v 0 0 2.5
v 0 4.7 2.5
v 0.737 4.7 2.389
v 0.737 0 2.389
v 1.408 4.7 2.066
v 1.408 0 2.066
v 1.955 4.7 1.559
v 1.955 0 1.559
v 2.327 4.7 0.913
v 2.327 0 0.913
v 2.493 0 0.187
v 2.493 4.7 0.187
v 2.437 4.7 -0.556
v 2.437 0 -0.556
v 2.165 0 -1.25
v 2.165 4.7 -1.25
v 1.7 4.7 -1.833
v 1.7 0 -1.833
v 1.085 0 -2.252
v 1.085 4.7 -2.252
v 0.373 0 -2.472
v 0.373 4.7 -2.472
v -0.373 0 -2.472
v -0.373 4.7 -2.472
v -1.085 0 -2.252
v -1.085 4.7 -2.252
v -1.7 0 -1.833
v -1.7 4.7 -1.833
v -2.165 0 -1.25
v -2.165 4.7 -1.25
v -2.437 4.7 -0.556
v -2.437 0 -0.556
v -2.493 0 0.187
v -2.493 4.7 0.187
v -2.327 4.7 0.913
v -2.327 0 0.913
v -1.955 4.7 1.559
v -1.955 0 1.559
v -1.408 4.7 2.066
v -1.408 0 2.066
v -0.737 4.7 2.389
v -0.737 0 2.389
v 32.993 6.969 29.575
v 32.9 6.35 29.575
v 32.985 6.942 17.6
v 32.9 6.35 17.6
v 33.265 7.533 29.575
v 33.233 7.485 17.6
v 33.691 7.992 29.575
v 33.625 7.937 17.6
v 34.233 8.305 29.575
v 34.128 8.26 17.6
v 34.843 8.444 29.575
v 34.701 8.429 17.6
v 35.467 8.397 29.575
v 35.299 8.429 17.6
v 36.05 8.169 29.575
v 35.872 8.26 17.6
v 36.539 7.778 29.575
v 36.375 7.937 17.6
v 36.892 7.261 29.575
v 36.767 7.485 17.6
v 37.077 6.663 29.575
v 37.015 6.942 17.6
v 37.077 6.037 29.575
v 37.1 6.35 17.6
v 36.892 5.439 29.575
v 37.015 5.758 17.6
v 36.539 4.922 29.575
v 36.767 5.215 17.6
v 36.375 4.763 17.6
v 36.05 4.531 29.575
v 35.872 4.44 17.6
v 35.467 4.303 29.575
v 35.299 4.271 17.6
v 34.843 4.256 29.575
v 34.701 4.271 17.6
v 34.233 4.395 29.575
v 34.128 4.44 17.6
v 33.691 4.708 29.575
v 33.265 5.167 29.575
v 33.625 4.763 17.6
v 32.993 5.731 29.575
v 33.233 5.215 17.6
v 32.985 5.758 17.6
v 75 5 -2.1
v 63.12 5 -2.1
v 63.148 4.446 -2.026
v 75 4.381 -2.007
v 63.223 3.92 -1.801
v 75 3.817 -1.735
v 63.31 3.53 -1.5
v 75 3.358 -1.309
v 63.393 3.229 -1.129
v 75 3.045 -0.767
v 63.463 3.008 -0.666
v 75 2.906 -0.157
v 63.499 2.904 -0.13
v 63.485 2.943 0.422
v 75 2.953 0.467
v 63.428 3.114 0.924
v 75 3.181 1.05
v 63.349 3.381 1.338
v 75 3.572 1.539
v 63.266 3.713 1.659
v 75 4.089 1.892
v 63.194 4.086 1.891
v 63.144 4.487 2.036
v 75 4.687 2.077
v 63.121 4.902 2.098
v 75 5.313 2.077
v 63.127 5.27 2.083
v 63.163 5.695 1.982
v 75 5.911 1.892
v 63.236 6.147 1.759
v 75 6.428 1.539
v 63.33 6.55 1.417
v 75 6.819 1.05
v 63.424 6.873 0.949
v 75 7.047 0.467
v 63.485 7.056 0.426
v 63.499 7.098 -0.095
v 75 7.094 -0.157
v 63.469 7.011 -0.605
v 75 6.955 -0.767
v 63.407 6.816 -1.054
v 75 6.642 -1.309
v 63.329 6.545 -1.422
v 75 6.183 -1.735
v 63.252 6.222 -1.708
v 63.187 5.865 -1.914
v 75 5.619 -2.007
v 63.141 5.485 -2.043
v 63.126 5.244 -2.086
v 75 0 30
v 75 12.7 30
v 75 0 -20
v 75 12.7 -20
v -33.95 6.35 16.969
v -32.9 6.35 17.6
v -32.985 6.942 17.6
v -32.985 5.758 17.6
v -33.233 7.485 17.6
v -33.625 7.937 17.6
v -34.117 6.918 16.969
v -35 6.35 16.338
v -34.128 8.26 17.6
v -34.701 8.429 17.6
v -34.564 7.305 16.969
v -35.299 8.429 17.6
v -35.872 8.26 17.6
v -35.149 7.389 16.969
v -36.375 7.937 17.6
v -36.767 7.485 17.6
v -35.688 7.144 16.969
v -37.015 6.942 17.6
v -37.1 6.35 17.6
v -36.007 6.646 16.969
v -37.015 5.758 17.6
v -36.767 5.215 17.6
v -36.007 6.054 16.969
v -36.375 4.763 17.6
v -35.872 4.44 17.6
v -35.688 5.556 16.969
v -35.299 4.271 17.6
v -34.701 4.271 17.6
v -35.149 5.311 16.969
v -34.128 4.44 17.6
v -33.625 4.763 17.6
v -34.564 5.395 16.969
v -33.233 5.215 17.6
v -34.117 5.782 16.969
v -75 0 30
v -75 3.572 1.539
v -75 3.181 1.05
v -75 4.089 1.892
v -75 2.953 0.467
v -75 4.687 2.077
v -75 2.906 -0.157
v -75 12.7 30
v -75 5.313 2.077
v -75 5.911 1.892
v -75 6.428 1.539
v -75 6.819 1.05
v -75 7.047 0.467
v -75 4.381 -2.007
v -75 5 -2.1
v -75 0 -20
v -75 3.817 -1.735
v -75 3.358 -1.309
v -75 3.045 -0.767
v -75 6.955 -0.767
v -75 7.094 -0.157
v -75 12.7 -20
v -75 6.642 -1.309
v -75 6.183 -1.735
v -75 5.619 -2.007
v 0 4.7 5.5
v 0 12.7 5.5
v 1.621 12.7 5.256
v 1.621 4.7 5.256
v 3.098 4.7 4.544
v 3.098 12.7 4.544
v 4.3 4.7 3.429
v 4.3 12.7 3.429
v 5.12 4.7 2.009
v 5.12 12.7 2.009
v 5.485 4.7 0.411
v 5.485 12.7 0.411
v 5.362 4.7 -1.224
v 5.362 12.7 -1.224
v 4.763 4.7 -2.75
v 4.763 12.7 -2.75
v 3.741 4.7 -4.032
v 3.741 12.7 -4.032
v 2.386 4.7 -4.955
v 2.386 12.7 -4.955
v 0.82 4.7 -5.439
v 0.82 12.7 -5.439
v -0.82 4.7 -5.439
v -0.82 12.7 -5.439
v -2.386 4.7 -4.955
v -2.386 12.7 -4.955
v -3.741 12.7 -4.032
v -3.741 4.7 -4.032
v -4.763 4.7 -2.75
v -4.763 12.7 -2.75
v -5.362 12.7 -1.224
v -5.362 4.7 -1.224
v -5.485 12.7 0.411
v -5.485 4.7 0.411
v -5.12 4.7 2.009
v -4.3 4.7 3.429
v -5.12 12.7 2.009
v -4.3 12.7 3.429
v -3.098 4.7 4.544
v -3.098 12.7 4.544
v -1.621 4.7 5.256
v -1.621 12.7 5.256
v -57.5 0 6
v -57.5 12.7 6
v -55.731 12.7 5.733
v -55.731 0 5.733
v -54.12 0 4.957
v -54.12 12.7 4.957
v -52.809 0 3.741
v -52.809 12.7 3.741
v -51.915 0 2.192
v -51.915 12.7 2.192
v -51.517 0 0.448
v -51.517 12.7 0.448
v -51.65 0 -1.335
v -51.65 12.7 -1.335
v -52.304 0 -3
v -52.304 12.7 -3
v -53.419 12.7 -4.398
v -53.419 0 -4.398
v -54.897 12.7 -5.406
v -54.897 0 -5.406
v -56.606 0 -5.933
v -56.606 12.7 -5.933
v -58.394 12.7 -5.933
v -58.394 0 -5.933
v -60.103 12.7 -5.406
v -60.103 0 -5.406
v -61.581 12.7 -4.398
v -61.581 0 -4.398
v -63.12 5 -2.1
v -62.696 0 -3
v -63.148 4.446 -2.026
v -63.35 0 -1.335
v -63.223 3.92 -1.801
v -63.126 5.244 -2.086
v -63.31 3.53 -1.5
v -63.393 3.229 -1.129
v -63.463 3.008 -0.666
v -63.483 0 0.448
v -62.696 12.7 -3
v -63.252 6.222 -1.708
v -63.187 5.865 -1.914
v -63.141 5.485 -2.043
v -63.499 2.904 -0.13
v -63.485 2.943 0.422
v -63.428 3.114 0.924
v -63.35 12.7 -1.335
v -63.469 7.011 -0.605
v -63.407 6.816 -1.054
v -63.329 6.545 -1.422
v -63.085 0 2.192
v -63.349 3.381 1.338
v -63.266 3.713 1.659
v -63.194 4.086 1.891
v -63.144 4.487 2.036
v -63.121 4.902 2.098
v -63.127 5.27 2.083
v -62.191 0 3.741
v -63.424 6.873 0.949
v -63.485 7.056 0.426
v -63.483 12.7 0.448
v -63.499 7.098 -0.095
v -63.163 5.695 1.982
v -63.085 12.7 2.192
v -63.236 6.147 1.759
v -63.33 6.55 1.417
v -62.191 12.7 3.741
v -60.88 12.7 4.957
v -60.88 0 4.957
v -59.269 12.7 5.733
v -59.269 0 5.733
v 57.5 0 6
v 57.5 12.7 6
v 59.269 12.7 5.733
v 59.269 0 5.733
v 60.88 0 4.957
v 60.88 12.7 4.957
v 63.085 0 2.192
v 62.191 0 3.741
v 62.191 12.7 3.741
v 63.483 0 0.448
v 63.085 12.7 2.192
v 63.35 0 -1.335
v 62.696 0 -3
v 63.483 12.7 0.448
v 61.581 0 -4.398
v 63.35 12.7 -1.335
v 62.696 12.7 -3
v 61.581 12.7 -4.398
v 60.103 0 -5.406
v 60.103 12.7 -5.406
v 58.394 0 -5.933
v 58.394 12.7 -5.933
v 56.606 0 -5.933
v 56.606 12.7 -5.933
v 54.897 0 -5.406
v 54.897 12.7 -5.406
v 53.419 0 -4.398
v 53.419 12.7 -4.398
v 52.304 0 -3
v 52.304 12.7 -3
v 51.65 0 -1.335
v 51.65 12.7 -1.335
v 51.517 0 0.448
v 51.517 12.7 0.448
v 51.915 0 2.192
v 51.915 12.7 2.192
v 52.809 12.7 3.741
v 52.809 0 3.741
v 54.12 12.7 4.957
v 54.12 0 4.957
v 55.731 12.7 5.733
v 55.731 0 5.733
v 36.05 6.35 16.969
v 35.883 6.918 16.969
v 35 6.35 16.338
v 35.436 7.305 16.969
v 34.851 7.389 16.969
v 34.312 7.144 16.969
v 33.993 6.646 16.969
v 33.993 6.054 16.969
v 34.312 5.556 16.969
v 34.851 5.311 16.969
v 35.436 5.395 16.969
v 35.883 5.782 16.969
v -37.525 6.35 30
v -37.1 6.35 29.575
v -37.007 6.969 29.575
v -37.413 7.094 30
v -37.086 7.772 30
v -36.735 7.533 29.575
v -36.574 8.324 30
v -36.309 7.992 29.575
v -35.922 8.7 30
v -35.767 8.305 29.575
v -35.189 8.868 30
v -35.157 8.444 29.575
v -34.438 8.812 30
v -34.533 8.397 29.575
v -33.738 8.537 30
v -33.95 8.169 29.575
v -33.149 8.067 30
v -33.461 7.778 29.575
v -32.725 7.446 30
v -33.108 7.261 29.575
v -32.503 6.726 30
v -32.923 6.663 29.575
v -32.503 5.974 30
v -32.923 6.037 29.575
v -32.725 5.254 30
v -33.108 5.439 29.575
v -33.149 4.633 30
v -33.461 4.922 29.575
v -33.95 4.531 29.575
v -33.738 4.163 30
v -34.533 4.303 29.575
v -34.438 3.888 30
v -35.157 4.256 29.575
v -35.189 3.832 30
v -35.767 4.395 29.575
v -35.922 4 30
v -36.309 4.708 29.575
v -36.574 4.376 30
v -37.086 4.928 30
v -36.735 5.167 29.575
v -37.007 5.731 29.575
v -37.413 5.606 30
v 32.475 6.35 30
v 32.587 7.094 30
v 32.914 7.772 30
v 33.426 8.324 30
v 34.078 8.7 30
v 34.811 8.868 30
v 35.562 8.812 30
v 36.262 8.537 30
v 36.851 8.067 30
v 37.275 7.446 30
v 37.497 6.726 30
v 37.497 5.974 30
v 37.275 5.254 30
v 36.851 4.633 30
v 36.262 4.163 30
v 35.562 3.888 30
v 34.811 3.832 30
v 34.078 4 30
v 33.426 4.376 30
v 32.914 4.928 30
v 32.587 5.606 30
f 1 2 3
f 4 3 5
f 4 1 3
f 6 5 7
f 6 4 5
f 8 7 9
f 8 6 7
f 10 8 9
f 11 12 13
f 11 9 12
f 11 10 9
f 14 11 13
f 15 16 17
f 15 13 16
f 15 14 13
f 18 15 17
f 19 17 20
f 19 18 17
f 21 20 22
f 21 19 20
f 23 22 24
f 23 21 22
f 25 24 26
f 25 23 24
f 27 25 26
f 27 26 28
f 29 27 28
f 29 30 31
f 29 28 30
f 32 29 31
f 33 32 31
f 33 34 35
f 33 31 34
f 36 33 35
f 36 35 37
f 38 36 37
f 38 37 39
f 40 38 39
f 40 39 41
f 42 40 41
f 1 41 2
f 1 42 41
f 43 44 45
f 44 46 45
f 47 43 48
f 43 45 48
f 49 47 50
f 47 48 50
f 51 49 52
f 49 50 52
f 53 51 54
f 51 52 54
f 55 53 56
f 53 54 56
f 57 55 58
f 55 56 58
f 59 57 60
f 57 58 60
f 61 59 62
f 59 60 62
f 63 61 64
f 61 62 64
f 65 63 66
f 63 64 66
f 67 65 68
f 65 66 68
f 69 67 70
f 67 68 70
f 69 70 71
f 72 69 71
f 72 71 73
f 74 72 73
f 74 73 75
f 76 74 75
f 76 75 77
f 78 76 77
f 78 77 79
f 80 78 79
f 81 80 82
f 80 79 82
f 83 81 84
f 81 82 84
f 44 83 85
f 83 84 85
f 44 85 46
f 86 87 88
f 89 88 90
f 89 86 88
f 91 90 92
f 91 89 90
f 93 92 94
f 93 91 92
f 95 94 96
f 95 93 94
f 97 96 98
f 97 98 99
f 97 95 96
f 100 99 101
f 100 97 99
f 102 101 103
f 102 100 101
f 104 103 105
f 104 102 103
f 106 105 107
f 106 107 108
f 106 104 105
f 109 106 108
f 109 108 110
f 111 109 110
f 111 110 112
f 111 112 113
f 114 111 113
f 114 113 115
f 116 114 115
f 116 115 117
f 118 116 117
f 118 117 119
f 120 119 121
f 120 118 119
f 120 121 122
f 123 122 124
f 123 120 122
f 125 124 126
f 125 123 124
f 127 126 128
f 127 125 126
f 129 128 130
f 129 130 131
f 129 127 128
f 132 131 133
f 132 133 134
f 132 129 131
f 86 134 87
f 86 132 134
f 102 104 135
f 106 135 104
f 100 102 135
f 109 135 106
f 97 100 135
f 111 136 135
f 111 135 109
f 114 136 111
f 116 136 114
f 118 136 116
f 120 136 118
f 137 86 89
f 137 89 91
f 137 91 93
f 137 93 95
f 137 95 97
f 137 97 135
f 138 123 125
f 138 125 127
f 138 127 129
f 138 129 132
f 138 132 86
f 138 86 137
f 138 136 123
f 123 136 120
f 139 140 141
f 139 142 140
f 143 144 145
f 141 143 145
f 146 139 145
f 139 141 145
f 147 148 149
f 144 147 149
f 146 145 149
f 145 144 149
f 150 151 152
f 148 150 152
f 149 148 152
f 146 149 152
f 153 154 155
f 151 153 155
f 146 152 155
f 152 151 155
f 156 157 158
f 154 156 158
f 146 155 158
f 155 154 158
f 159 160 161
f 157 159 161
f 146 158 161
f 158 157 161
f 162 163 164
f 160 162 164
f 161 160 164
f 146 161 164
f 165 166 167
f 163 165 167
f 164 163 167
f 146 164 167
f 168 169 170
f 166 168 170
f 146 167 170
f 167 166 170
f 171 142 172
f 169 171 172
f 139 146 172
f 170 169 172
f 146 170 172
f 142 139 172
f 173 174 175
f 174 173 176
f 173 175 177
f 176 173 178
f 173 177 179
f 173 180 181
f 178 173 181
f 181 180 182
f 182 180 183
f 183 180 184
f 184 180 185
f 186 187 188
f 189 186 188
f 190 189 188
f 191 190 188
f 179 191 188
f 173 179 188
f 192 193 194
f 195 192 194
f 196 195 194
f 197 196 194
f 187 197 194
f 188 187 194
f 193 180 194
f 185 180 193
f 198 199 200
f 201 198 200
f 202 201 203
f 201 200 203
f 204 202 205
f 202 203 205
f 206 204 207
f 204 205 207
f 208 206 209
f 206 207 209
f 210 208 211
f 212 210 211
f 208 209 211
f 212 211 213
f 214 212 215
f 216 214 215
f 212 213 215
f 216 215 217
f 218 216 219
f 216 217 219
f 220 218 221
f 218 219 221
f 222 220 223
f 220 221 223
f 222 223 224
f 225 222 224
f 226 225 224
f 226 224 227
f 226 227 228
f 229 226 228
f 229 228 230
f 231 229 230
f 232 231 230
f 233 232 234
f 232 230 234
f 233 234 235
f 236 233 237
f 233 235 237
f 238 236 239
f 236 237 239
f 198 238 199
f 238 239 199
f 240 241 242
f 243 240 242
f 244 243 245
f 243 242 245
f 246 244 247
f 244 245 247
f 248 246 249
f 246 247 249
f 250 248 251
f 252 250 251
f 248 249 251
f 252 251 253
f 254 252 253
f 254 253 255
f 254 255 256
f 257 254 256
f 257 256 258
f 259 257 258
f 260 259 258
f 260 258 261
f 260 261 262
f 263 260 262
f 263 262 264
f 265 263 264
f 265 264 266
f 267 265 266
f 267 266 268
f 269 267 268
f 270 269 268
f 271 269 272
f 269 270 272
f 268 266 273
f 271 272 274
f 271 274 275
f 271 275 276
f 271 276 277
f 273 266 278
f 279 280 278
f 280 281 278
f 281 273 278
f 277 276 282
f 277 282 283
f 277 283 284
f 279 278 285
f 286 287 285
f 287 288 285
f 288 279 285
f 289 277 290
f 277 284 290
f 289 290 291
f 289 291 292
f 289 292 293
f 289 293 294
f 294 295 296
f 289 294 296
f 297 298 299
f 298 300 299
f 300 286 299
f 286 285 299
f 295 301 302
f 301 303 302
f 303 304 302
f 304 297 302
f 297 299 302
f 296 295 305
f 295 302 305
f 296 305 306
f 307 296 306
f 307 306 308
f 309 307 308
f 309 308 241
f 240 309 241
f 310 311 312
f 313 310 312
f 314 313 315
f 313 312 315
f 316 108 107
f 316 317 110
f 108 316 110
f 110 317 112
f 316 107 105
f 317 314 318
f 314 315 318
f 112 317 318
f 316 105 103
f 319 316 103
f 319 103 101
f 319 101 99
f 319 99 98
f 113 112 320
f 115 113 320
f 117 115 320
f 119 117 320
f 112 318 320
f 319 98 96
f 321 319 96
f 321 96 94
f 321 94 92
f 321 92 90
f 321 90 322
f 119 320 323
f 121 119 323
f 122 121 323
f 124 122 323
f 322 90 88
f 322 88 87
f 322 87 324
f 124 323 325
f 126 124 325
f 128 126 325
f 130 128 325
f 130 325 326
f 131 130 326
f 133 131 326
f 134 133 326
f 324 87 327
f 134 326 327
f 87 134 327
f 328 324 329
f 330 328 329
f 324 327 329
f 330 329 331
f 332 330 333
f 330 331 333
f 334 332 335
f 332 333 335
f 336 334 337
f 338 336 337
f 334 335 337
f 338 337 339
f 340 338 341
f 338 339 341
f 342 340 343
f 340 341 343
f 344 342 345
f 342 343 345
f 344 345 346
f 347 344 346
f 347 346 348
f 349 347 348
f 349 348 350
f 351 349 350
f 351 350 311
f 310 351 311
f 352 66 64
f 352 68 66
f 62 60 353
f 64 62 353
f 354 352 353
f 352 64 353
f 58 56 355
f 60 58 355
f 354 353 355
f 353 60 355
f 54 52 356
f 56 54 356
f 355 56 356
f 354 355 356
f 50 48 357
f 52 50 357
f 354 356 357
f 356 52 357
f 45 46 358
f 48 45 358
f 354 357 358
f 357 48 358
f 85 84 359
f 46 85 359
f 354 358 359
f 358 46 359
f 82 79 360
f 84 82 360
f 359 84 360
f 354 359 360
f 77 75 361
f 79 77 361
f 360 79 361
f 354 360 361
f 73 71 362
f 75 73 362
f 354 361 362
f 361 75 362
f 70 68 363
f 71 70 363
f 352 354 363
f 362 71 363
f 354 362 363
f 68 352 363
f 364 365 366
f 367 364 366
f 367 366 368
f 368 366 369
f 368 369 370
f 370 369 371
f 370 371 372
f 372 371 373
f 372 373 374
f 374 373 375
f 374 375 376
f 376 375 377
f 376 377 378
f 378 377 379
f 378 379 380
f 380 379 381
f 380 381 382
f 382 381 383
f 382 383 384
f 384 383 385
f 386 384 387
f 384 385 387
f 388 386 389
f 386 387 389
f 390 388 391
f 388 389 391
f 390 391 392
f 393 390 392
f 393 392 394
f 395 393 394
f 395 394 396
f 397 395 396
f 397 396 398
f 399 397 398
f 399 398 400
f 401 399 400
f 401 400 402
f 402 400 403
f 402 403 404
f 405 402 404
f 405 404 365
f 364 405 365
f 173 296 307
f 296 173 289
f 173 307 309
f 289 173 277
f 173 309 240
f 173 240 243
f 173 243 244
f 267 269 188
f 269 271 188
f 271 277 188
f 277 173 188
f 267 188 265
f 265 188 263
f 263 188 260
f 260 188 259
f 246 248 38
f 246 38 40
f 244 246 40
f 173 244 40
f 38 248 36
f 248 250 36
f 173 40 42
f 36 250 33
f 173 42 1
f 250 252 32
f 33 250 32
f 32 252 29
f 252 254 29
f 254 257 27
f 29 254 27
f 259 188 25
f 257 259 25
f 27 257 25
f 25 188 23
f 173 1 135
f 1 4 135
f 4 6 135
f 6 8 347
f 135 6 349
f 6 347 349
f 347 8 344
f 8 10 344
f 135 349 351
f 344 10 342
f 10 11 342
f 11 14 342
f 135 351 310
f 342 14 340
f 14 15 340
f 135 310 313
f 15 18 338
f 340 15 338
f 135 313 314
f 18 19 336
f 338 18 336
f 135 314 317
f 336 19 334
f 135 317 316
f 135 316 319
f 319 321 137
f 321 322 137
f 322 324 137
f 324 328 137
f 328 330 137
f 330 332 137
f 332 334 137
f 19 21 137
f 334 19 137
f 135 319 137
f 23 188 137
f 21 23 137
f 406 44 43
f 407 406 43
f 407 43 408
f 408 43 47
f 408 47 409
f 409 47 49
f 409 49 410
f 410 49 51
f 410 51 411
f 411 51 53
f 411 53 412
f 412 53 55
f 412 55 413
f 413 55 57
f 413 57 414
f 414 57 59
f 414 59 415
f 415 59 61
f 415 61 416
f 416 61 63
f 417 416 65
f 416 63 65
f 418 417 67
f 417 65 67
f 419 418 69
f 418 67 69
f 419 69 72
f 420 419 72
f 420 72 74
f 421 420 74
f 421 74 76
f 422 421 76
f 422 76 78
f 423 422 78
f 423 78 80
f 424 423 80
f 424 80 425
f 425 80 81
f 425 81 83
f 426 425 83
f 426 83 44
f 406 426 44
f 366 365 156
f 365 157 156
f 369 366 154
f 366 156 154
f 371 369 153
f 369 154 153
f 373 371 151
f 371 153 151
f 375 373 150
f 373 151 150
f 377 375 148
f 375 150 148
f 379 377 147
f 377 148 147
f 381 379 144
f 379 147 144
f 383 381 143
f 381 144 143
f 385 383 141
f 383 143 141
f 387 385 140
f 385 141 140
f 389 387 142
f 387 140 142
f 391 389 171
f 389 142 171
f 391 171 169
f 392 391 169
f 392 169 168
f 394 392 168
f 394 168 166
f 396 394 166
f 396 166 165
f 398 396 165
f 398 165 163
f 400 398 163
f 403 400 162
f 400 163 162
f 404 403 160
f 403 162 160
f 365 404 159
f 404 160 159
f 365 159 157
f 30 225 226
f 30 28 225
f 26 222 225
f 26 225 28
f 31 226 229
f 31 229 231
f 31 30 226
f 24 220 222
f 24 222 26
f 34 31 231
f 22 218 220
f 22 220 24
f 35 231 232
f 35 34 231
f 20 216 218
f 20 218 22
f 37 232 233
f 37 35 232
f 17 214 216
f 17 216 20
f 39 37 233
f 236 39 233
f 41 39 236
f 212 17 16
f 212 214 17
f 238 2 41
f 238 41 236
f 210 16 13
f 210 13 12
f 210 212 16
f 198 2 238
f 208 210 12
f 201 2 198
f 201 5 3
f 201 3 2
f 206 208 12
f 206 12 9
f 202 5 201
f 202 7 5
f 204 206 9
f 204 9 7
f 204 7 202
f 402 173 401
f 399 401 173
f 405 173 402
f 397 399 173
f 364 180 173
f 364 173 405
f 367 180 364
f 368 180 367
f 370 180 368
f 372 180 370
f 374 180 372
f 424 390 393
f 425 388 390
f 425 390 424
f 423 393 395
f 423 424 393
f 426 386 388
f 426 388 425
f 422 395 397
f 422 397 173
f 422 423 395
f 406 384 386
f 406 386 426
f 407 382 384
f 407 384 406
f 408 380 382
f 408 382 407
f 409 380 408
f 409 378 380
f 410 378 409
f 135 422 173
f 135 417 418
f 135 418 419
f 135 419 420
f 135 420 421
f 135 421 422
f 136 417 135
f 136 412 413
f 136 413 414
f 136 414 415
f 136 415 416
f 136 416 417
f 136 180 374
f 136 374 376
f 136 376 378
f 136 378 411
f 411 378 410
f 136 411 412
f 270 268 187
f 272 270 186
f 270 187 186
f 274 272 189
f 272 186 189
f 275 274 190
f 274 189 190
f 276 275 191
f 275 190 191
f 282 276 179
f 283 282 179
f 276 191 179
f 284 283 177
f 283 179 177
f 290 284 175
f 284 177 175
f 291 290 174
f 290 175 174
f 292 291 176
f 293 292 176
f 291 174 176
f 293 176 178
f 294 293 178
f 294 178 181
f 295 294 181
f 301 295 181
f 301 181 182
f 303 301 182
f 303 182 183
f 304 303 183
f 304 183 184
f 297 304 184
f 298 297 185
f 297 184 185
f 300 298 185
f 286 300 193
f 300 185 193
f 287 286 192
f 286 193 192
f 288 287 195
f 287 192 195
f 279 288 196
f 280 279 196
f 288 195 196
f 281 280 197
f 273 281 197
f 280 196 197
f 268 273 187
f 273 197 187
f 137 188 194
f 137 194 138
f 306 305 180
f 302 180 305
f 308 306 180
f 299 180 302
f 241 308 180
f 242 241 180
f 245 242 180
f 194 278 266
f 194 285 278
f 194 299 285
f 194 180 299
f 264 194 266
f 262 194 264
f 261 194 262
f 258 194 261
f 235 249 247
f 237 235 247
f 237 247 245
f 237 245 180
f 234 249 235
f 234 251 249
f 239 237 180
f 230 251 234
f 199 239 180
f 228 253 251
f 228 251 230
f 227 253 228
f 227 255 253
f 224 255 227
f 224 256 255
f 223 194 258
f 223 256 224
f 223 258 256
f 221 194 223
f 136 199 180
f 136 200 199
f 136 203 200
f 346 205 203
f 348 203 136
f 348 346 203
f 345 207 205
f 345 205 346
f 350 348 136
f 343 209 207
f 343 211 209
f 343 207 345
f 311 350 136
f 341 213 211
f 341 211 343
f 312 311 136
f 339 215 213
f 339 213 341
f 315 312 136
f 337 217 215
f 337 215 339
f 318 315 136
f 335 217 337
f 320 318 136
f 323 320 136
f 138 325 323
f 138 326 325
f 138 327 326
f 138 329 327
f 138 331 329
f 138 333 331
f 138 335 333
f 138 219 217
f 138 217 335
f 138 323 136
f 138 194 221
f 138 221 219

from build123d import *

# Parameters (mm, degrees)
ESBO_O1_W                       = 150
ESBO_O1_H                       = 40
ESBO_O1_R                       = 2.5
RESSALTO_EXTRUS_O1_DEPTH        = 12.7
ESBO_O2_R                       = 5.5
CORTE_EXTRUS_O1_DEPTH           = 8
ESBO_O3_R                       = 6
CORTE_EXTRUS_O3_DEPTH           = 79.652971972
ESBO_O7_W                       = 150
ESBO_O7_H                       = 10
RESSALTO_EXTRUS_O2_DEPTH        = 12.7
ESBO_O8_R                       = 2
CORTE_EXTRUS_O4_DEPTH           = 10
FURO_ROSCADO_DE_M54_D           = 4.2
FURO_ROSCADO_DE_M54_DEPTH       = 12.4
FURO_ROSCADO_DE_M54_CSINK_D     = 5.05
FURO_ROSCADO_DE_M54_CSINK_ANGLE = 90
FURO_ROSCADO_DE_M54_TIP         = 1.2618073
FURO_ROSCADO_DE_M55_D           = 4.2
FURO_ROSCADO_DE_M55_DEPTH       = 12.4
FURO_ROSCADO_DE_M55_CSINK_D     = 5.05
FURO_ROSCADO_DE_M55_CSINK_ANGLE = 90
FURO_ROSCADO_DE_M55_TIP         = 1.2618073


with BuildPart() as part:
    # Esboço1 → Ressalto-extrusão1 (new body)
    with BuildSketch(Plane(origin=(0, 0, 0), x_dir=(1, 0, 0), z_dir=(0, 1, 0))):
        Rectangle(ESBO_O1_W, ESBO_O1_H)
        with Locations(Location((0, 0, 0), (0, 0, 270))):
            Circle(ESBO_O1_R, mode=Mode.SUBTRACT)
    extrude(amount=RESSALTO_EXTRUS_O1_DEPTH)

    # Esboço2 → Corte-extrusão1 (cut)
    with BuildSketch(Plane(origin=(0, 12.7, 0), x_dir=(1, 0, 0), z_dir=(0, 1, 0))):
        with Locations(Location((0, 0, 0), (0, 0, 270))):
            Circle(ESBO_O2_R)
    extrude(amount=-CORTE_EXTRUS_O1_DEPTH, mode=Mode.SUBTRACT)

    # Esboço3 → Corte-extrusão3 (cut, through all)
    with BuildSketch(Plane(origin=(0, 12.7, 0), x_dir=(1, 0, 0), z_dir=(0, 1, 0))):
        with Locations(Location((-57.5, 0, 0), (0, 0, 270))):
            Circle(ESBO_O3_R)
        with Locations(Location((57.5, 0, 0), (0, 0, 270))):
            Circle(ESBO_O3_R)
    extrude(amount=-CORTE_EXTRUS_O3_DEPTH, mode=Mode.SUBTRACT)

    # Esboço6 → Furo roscado de M51 (revolve, cut)
    with BuildSketch(Plane(origin=(75, 5, 0), x_dir=(0, 0, -1), z_dir=(0, 1, 0))):
        Polygon((0, 0), (0, 13.2618073), (2.1, 12), (2.1, 0), align=None)
    furo_roscado_de_m51 = revolve(axis=Axis((81.35, 5, 0), (-1, 0, 0)), mode=Mode.SUBTRACT)

    # Espelhar1: Furo roscado de M51 across plane
    add(furo_roscado_de_m51.mirror(Plane(origin=(0, 0, 0), x_dir=(0, 0, 1), z_dir=(1, 0, 0))), mode=Mode.SUBTRACT)

    # Esboço7 → Ressalto-extrusão2 (add)
    with BuildSketch(Plane(origin=(0, 12.7, 0), x_dir=(1, 0, 0), z_dir=(0, 1, 0))):
        with Locations((0, -25)):
            Rectangle(ESBO_O7_W, ESBO_O7_H)
    extrude(amount=-RESSALTO_EXTRUS_O2_DEPTH)

    # Esboço8 → Corte-extrusão4 (cut)
    with BuildSketch(Plane.XY.offset(30)):
        with Locations((35, 6.35)):
            Circle(ESBO_O8_R)
        with Locations((-35, 6.35)):
            Circle(ESBO_O8_R)
    extrude(amount=-CORTE_EXTRUS_O4_DEPTH, mode=Mode.SUBTRACT)

    # Furo roscado de M54
    with Locations(Plane.XY.offset(30)):
        with Locations((-35, 6.35)):
            CounterSinkHole(FURO_ROSCADO_DE_M54_D / 2, FURO_ROSCADO_DE_M54_CSINK_D / 2, depth=FURO_ROSCADO_DE_M54_DEPTH, counter_sink_angle=FURO_ROSCADO_DE_M54_CSINK_ANGLE)
            with Locations((0, 0, -(FURO_ROSCADO_DE_M54_DEPTH + FURO_ROSCADO_DE_M54_TIP / 2))):  # 118° drill point
                Cone(0, FURO_ROSCADO_DE_M54_D / 2, FURO_ROSCADO_DE_M54_TIP, mode=Mode.SUBTRACT)

    # Furo roscado de M55
    with Locations(Plane.XY.offset(30)):
        with Locations((35, 6.35)):
            CounterSinkHole(FURO_ROSCADO_DE_M55_D / 2, FURO_ROSCADO_DE_M55_CSINK_D / 2, depth=FURO_ROSCADO_DE_M55_DEPTH, counter_sink_angle=FURO_ROSCADO_DE_M55_CSINK_ANGLE)
            with Locations((0, 0, -(FURO_ROSCADO_DE_M55_DEPTH + FURO_ROSCADO_DE_M55_TIP / 2))):  # 118° drill point
                Cone(0, FURO_ROSCADO_DE_M55_D / 2, FURO_ROSCADO_DE_M55_TIP, mode=Mode.SUBTRACT)


solid = part.part
